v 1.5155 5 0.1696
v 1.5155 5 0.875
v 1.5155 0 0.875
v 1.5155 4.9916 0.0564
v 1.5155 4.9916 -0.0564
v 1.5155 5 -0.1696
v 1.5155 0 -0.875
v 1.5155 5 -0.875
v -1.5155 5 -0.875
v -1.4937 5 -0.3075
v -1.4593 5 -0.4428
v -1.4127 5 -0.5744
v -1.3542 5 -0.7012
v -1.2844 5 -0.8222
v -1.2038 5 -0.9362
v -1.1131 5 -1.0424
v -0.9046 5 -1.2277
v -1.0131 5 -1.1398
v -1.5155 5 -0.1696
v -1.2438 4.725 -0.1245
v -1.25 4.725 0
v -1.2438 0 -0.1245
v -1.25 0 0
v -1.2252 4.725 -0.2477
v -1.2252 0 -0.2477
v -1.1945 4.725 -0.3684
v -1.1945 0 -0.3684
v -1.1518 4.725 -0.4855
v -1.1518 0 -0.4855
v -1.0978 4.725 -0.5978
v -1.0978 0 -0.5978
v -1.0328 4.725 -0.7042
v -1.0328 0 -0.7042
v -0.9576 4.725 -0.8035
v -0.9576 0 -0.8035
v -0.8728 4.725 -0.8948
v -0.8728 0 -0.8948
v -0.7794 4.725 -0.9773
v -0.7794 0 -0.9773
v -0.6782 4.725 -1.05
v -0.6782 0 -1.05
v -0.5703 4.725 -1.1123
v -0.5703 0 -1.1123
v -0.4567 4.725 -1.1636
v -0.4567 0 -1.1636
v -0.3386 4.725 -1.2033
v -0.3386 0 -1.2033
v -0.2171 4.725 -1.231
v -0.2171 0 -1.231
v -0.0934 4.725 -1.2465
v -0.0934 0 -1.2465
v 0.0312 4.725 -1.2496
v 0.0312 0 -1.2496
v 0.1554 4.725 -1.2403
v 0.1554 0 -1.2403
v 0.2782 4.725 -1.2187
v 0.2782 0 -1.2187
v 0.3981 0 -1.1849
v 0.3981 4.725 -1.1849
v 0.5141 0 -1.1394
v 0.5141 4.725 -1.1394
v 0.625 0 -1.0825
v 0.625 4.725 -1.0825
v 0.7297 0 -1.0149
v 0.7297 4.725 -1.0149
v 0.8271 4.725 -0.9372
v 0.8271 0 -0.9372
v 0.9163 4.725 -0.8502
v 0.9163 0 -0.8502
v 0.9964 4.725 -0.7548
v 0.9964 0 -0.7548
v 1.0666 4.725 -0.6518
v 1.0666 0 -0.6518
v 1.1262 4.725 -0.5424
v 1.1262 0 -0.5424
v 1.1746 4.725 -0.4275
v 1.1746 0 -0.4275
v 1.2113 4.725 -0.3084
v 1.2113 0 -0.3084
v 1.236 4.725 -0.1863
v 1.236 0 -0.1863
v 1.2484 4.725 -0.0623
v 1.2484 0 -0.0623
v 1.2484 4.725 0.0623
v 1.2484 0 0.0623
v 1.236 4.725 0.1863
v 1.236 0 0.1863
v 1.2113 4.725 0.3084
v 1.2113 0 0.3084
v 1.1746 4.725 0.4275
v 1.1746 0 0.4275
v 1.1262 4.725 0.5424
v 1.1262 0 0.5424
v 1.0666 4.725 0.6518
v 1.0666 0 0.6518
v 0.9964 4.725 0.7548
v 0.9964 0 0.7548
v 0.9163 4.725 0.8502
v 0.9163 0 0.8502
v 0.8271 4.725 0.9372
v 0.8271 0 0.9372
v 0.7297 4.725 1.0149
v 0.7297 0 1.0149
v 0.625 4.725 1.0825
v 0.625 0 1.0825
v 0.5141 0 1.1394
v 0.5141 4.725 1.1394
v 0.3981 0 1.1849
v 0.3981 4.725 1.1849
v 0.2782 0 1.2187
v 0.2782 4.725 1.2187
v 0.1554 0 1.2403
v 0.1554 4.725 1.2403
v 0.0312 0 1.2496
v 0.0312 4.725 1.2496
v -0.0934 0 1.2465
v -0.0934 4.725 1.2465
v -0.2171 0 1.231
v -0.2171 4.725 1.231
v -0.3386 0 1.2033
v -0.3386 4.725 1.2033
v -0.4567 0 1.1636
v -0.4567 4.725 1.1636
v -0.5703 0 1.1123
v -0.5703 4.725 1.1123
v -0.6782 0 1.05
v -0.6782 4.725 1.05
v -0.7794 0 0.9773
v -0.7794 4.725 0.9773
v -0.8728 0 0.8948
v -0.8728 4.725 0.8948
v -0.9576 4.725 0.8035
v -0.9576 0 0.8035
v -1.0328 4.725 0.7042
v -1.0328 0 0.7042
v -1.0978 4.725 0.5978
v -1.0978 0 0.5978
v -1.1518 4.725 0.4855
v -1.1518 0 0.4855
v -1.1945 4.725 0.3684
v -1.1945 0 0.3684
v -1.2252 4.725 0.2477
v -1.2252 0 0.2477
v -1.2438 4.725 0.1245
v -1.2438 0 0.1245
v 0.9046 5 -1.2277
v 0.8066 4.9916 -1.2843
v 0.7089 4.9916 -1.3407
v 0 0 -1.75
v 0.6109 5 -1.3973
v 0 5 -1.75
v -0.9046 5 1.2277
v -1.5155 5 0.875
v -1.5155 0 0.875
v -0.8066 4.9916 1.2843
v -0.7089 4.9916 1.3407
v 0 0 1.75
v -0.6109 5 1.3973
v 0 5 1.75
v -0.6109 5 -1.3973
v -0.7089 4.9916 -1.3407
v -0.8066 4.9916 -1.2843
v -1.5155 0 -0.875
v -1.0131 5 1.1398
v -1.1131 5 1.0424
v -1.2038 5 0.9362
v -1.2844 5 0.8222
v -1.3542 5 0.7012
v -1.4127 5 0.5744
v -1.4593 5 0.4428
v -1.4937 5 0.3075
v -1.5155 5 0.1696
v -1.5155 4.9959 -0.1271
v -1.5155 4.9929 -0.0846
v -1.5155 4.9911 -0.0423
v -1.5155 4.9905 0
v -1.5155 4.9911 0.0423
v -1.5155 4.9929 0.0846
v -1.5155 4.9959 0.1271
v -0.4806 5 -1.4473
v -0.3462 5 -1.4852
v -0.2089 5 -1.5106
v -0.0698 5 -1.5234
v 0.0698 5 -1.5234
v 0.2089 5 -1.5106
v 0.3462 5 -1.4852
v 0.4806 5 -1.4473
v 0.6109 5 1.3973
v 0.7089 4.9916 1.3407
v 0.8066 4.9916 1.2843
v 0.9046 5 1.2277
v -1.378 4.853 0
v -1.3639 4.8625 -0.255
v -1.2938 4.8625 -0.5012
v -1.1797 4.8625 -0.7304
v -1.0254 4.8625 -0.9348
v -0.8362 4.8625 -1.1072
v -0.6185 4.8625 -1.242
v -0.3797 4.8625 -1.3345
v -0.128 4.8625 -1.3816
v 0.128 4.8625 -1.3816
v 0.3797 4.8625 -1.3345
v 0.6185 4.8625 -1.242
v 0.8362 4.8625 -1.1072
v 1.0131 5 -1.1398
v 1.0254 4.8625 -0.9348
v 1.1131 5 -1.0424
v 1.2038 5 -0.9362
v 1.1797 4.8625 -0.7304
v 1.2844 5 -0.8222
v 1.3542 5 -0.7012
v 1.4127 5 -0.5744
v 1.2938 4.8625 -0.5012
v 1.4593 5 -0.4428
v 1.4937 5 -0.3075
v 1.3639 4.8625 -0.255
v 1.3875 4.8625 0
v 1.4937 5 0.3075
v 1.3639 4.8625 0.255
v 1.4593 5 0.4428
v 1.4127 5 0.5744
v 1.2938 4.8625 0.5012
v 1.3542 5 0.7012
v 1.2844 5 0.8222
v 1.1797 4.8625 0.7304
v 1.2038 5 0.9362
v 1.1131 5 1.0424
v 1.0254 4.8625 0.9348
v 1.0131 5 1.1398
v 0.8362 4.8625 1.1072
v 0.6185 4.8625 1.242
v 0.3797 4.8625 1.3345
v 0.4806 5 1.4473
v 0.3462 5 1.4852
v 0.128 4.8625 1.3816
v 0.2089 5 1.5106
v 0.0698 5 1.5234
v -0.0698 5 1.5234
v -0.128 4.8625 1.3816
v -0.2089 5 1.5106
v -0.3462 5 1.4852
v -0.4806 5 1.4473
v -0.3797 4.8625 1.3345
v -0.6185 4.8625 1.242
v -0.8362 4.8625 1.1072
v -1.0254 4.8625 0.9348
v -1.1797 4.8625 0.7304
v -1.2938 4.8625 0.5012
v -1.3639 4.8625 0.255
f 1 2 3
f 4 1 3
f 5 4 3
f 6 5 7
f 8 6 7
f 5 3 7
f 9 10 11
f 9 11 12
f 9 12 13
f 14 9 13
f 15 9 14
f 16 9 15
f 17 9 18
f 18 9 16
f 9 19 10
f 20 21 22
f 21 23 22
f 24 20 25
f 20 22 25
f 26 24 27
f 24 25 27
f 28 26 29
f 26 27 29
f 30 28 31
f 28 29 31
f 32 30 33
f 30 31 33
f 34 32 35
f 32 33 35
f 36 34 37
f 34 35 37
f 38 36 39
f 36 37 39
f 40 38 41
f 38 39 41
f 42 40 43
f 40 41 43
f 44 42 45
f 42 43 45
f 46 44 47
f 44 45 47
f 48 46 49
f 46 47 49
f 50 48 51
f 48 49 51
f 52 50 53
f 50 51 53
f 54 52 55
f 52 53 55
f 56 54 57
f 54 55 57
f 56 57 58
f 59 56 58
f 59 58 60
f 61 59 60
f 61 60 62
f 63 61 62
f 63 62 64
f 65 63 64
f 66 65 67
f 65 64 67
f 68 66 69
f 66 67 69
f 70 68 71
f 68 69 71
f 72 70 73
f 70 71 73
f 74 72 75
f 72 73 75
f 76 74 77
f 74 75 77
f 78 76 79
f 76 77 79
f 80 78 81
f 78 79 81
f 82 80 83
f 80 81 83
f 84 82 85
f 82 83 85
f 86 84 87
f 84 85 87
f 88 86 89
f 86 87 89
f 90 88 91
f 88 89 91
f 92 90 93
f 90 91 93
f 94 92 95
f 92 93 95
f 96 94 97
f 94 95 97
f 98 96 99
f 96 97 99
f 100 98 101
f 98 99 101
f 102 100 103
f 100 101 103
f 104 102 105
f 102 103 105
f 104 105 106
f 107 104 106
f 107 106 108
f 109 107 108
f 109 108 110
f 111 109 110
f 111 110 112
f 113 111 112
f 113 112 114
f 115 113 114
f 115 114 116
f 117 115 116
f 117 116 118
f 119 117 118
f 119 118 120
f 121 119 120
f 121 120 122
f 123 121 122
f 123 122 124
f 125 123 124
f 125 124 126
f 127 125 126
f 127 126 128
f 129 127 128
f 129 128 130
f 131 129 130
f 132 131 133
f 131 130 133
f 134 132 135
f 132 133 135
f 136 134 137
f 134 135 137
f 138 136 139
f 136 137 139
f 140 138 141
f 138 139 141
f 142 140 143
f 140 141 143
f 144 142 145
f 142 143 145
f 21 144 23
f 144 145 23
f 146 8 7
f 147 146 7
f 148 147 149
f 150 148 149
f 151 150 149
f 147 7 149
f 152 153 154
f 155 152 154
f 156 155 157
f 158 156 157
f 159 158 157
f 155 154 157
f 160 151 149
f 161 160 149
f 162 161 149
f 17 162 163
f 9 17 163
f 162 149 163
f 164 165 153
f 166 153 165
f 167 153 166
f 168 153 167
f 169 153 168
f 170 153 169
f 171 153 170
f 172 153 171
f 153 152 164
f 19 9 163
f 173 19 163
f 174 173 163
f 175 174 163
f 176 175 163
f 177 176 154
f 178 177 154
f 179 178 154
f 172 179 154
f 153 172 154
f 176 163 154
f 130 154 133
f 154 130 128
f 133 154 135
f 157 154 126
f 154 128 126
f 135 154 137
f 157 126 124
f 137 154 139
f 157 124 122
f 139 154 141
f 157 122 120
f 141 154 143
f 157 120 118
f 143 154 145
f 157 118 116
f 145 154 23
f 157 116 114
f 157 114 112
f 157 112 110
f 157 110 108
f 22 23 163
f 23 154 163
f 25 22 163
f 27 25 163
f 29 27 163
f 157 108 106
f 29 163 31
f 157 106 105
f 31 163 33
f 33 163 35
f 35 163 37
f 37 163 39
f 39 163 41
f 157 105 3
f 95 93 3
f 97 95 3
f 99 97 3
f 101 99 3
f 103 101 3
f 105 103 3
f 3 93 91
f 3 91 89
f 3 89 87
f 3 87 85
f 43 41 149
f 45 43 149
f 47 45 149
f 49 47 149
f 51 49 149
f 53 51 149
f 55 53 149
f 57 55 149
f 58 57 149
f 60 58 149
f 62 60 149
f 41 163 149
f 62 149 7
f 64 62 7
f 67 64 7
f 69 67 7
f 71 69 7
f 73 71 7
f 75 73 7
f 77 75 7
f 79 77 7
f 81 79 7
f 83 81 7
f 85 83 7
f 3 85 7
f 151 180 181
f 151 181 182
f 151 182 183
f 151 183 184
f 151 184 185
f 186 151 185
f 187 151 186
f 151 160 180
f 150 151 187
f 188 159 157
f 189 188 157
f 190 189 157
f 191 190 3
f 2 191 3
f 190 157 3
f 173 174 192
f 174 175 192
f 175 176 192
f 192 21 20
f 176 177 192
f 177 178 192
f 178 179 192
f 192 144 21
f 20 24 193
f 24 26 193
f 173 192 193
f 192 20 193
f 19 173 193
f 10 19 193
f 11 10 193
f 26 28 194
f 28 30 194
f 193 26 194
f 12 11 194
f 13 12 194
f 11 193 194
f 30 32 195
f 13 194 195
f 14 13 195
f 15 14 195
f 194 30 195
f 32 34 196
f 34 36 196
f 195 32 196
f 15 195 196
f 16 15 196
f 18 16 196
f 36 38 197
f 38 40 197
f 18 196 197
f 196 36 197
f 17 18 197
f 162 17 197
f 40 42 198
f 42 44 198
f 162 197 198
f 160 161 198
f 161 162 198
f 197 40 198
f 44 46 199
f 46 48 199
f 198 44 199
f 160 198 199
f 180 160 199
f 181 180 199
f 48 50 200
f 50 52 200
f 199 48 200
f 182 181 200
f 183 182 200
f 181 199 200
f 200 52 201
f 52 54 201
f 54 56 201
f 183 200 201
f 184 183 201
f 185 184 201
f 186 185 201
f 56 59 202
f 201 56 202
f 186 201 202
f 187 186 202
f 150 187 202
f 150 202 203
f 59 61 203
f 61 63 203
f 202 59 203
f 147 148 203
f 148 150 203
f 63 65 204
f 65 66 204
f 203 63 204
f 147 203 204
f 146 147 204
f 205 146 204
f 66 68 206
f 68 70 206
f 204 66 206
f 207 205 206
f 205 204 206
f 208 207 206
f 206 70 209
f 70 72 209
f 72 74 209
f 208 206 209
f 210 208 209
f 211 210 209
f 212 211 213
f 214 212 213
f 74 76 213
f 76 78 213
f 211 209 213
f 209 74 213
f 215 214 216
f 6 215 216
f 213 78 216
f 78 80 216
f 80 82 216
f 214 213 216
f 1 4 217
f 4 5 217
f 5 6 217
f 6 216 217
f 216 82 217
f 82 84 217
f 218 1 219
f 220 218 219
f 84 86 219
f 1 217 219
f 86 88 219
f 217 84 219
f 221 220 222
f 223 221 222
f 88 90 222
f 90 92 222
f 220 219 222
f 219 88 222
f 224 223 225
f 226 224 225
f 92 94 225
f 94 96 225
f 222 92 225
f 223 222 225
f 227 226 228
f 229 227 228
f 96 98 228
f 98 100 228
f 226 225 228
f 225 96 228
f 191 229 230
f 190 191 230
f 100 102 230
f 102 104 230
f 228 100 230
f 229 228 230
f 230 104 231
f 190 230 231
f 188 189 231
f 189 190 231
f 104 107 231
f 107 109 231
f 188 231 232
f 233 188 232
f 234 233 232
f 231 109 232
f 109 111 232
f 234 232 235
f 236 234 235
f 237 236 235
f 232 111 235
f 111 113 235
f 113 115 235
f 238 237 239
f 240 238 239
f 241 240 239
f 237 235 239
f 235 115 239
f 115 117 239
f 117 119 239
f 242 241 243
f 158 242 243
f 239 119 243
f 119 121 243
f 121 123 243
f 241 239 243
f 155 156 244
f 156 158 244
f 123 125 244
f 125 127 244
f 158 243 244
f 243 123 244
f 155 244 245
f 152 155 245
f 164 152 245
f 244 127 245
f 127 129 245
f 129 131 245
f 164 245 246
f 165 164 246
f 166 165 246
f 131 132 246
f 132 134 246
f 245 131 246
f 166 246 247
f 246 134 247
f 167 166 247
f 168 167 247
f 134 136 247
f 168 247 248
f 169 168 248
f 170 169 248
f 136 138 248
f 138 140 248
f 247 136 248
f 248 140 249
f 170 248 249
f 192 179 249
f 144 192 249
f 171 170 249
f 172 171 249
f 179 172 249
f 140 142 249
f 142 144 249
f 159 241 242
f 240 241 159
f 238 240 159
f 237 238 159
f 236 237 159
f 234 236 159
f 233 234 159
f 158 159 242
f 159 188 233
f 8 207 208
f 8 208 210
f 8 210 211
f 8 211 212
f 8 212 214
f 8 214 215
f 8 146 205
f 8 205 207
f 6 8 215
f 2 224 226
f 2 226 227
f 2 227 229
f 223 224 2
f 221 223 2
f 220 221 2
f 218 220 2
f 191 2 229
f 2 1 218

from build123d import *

# Parameters (mm, degrees)
BOSS_EXTRUDE2_DEPTH         = 5
M3_TAPPED_HOLE1_D           = 2.5
M3_TAPPED_HOLE1_CSINK_D     = 3.05
M3_TAPPED_HOLE1_CSINK_ANGLE = 90


with BuildPart() as part:
    # Sketch1 → Boss-Extrude2 (new body)
    with BuildSketch(Plane(origin=(0, 0, 0), x_dir=(1, 0, 0), z_dir=(0, 1, 0))):
        with BuildLine():
            Line((-1.515544457, -0.875), (-1.299038106, -0.75))
            ThreePointArc((-1.299038106, -0.75), (-1.5, 0), (-1.299038106, 0.75))
            Line((-1.299038106, 0.75), (-1.515544457, 0.875))
            Line((-1.515544457, 0.875), (-1.515544457, -0.875))
        make_face()
        with BuildLine():
            Line((-1.299038106, -0.75), (0, 0))
            Line((0, 0), (-1.299038106, 0.75))
            ThreePointArc((-1.299038106, 0.75), (-1.5, 0), (-1.299038106, -0.75))
        make_face()
        with BuildLine():
            Line((0, -1.75), (0, -1.5))
            ThreePointArc((0, -1.5), (-0.75, -1.299038106), (-1.299038106, -0.75))
            Line((-1.299038106, -0.75), (-1.515544457, -0.875))
            Line((-1.515544457, -0.875), (0, -1.75))
        make_face()
        with BuildLine():
            Line((0, -1.5), (0, 0))
            Line((0, 0), (-1.299038106, -0.75))
            ThreePointArc((-1.299038106, -0.75), (-0.75, -1.299038106), (0, -1.5))
        make_face()
        with BuildLine():
            Line((1.299038106, -0.75), (0, 0))
            Line((0, 0), (0, -1.5))
            ThreePointArc((0, -1.5), (0.75, -1.299038106), (1.299038106, -0.75))
        make_face()
        with BuildLine():
            Line((1.299038106, 0.75), (0, 0))
            Line((0, 0), (1.299038106, -0.75))
            ThreePointArc((1.299038106, -0.75), (1.448888739, -0.388228568), (1.5, 0))
            ThreePointArc((1.5, 0), (1.448888739, 0.388228568), (1.299038106, 0.75))
        make_face()
        with BuildLine():
            Line((0.75, 1.299038106), (0, 0))
            Line((0, 0), (1.299038106, 0.75))
            ThreePointArc((1.299038106, 0.75), (1.060660172, 1.060660172), (0.75, 1.299038106))
        make_face()
        with BuildLine():
            Line((0, 1.5), (0, 0))
            Line((0, 0), (0.75, 1.299038106))
            ThreePointArc((0.75, 1.299038106), (0.388228568, 1.448888739), (0, 1.5))
        make_face()
        with BuildLine():
            Line((-1.299038106, 0.75), (0, 0))
            Line((0, 0), (0, 1.5))
            ThreePointArc((0, 1.5), (-0.75, 1.299038106), (-1.299038106, 0.75))
        make_face()
        with BuildLine():
            ThreePointArc((-1.299038106, 0.75), (-0.75, 1.299038106), (0, 1.5))
            Line((0, 1.5), (0, 1.75))
            Line((0, 1.75), (-1.515544457, 0.875))
            Line((-1.515544457, 0.875), (-1.299038106, 0.75))
        make_face()
        with BuildLine():
            Line((0, 1.75), (0, 1.5))
            ThreePointArc((0, 1.5), (0.388228568, 1.448888739), (0.75, 1.299038106))
            ThreePointArc((0.75, 1.299038106), (1.060660172, 1.060660172), (1.299038106, 0.75))
            Line((1.299038106, 0.75), (1.515544457, 0.875))
            Line((1.515544457, 0.875), (0, 1.75))
        make_face()
        with BuildLine():
            Line((1.515544457, 0.875), (1.299038106, 0.75))
            ThreePointArc((1.299038106, 0.75), (1.448888739, 0.388228568), (1.5, 0))
            ThreePointArc((1.5, 0), (1.448888739, -0.388228568), (1.299038106, -0.75))
            Line((1.299038106, -0.75), (1.515544457, -0.875))
            Line((1.515544457, -0.875), (1.515544457, 0.875))
        make_face()
        with BuildLine():
            Line((1.515544457, -0.875), (1.299038106, -0.75))
            ThreePointArc((1.299038106, -0.75), (0.75, -1.299038106), (0, -1.5))
            Line((0, -1.5), (0, -1.75))
            Line((0, -1.75), (1.515544457, -0.875))
        make_face()
    extrude(amount=BOSS_EXTRUDE2_DEPTH)

    # M3 Tapped Hole1 (through all)
    with Locations(Plane(origin=(0, 5, 0), x_dir=(1, 0, 0), z_dir=(0, 1, 0))):
        with Locations((0, 0)):
            CounterSinkHole(M3_TAPPED_HOLE1_D / 2, M3_TAPPED_HOLE1_CSINK_D / 2, counter_sink_angle=M3_TAPPED_HOLE1_CSINK_ANGLE)


solid = part.part
